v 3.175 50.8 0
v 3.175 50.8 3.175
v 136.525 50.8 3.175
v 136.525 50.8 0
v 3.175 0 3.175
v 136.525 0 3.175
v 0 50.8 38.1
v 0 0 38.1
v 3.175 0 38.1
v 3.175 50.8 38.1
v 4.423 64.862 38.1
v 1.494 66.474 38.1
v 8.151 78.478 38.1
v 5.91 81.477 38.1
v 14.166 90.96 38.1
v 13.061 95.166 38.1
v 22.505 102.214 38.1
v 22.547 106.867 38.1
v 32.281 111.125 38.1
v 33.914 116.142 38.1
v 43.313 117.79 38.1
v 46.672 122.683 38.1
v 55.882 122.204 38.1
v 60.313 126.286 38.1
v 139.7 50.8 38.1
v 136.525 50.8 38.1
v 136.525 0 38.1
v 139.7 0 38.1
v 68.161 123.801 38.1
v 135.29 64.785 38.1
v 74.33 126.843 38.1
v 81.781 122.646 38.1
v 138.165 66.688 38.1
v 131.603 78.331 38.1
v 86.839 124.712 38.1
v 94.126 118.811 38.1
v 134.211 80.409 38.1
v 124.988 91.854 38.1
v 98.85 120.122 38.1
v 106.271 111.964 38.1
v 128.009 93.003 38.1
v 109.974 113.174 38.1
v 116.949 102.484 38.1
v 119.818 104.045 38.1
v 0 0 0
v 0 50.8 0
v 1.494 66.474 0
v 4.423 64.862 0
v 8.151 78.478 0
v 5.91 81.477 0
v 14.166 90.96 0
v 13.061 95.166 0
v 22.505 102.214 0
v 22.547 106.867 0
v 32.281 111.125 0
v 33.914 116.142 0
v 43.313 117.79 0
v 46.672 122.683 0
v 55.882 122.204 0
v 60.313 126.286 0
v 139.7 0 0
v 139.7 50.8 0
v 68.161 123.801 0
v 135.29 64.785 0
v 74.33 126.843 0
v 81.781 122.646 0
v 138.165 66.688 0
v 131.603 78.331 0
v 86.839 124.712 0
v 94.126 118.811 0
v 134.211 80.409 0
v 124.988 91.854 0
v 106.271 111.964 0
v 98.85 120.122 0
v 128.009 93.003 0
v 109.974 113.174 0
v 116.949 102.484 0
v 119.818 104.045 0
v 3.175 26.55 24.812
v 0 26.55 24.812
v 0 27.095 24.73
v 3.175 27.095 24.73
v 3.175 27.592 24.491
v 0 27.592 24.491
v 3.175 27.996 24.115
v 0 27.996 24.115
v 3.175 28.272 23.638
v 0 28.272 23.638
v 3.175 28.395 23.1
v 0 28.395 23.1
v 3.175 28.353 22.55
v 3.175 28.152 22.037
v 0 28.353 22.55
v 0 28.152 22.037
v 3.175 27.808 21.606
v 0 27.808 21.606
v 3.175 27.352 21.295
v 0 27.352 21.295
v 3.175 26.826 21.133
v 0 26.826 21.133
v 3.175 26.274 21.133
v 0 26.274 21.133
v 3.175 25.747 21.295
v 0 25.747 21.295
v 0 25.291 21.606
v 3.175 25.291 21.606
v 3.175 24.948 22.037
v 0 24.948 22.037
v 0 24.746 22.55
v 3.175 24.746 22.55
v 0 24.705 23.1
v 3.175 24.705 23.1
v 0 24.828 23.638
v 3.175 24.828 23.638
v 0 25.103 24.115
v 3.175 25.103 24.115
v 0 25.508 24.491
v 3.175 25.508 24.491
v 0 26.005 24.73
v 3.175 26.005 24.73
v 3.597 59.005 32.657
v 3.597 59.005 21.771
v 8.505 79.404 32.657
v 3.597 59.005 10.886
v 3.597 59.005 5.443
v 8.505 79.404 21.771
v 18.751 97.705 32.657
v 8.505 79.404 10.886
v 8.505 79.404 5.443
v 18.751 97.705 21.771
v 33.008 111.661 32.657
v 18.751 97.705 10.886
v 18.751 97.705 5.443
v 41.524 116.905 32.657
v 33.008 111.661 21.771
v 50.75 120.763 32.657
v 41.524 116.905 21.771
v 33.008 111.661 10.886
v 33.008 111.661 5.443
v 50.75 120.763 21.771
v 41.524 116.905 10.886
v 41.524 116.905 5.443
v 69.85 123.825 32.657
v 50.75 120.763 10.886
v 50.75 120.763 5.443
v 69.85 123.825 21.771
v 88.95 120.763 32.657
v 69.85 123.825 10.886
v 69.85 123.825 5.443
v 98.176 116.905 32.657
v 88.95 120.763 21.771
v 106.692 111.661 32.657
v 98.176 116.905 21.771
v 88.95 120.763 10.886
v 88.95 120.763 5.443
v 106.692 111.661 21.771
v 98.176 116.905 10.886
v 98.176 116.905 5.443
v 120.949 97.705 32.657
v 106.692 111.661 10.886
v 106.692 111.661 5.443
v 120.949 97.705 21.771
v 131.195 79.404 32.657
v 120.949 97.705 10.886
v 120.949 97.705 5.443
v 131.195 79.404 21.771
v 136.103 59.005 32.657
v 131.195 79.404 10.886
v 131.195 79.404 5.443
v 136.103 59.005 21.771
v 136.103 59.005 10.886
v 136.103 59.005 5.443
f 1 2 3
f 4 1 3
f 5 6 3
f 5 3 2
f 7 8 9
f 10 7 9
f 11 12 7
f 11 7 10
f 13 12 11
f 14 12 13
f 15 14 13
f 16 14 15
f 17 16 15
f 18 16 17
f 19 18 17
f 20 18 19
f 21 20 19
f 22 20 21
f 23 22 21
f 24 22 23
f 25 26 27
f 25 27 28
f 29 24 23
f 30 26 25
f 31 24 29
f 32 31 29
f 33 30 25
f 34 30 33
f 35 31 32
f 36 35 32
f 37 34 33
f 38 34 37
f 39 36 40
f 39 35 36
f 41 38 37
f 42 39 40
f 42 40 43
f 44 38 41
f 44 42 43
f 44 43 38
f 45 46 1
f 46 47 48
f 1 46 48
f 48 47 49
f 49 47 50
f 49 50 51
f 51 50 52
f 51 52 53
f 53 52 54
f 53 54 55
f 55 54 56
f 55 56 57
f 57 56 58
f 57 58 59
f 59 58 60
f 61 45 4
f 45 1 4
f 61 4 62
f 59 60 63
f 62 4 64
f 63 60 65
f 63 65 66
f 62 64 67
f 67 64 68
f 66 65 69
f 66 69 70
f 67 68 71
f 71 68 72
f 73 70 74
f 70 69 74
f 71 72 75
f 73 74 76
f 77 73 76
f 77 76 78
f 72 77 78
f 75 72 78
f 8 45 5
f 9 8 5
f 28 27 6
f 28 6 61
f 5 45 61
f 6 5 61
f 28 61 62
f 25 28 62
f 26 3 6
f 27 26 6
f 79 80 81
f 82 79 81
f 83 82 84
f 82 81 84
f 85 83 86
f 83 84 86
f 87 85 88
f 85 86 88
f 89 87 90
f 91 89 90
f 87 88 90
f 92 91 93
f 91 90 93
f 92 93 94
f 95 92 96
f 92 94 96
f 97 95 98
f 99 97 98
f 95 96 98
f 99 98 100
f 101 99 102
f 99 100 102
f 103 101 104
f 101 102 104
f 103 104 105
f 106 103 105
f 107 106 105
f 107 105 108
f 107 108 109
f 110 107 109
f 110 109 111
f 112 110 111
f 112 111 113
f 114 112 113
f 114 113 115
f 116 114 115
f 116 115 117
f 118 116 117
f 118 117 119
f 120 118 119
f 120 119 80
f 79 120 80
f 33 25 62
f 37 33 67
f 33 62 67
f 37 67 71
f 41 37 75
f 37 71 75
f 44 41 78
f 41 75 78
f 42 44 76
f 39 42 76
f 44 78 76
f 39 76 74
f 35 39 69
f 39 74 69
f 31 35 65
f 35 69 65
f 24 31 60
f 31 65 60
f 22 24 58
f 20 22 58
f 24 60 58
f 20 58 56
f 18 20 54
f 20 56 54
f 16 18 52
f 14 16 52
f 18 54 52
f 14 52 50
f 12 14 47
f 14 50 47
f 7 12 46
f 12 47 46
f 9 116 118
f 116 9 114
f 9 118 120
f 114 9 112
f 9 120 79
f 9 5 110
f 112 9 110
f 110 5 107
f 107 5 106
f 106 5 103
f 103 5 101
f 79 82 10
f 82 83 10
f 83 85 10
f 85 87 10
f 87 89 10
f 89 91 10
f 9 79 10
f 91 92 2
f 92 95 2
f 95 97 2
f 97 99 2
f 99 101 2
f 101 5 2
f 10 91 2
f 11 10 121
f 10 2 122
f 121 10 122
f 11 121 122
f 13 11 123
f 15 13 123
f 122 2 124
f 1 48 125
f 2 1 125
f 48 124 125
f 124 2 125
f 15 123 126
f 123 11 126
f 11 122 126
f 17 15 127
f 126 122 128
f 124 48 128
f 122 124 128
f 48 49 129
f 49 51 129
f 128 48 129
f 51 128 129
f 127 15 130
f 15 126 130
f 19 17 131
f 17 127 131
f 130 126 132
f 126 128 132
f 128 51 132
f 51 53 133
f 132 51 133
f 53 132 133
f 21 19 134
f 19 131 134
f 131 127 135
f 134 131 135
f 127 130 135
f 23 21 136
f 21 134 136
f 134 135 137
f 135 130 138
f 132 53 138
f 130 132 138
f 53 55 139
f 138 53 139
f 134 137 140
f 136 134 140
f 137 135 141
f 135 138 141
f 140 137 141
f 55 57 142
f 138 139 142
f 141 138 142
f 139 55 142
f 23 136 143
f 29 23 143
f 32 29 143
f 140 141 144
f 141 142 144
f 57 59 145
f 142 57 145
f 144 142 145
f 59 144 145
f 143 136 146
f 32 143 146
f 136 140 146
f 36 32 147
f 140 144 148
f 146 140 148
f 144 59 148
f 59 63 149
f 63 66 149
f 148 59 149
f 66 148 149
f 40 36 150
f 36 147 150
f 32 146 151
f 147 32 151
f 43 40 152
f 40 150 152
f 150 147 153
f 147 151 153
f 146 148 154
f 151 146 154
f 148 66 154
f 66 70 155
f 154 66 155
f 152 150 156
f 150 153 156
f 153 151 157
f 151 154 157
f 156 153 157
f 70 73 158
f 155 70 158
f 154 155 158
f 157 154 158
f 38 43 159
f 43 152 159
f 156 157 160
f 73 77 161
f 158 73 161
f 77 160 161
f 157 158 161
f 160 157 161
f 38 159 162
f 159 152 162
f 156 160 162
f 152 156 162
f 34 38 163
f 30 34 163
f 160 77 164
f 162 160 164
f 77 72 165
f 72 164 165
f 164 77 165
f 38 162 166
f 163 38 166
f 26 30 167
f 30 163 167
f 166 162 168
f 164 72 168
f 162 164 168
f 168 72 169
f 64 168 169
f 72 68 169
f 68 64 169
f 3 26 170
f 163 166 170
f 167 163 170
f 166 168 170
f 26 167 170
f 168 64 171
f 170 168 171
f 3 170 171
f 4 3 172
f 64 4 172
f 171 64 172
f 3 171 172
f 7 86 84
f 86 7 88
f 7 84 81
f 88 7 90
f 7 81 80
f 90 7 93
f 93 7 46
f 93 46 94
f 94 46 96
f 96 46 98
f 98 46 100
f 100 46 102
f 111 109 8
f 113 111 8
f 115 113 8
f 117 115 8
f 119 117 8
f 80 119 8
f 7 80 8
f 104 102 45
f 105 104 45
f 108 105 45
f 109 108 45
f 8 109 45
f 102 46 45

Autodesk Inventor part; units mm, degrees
ref_plane "YZ Plane" through (0, 0, 0) normal (1, 0, 0) x (0, 1, 0)
ref_plane "XZ Plane" through (0, 0, 0) normal (0, 1, 0) x (-1, 0, 0)
sketch "Sketch1" plane through (0, 0, 0) normal (0, 0, 1) x (1, 0, 0)
  line L0 (139.7, 0) -> (139.7, 50.8)
  line L1 (0, 50.8) -> (0, 0)
  ellipse E0 centre (69.85, 50.8) end of major axis (139.7, 50.8) minor radius 76.2 (139.7, 50.8) -> (0, 50.8) ccw
  line L2 (136.525, 50.8) -> (136.525, 3.175)
  line L3 (3.175, 3.175) -> (3.175, 50.8)
  line L4 (3.175, 3.175) -> (3.175, 0)
  line L5 (136.525, 3.175) -> (136.525, 0)
  line L6 (0, 0) -> (3.175, 0)
  line L7 (136.525, 0) -> (139.7, 0)
  spline S0 degree 5 poles (3.175, 50.8) (3.175, 52.444) (3.2172, 54.088) (3.3017, 55.7305) (4.0773, 65.7654) (6.4328, 75.6371) (9.4981, 83.5865) (17.5722, 98.0931) (29.3701, 109.7459) (35.928, 114.5559) (50.1357, 121.8737) (65.8938, 124.4523) (73.8062, 124.4523) (89.5643, 121.8737) (103.772, 114.5559) (110.3299, 109.7459) (122.1278, 98.0931) (130.2019, 83.5865) (133.2672, 75.6371) (135.6227, 65.7654) (136.3983, 55.7305) (136.4828, 54.088) (136.525, 52.444) (136.525, 50.8) knots 0 0 0 0 0 0 0.03744 0.03744 0.03744 0.22914 0.22914 0.22914 0.411521 0.411521 0.411521 0.588479 0.588479 0.588479 0.77086 0.77086 0.77086 0.96256 0.96256 0.96256 1 1 1 1 1 1
  dimension "d0" = 139.7
  dimension "d1" = 50.8
extrude "Extrusion1" add sketch "Sketch1" along normal blind 38.1
ref_plane "Work Plane1" through (136.525, 0, 0) normal (0, -1, 0) x (1, 0, 0)
sketch "Sketch2" plane through (136.525, 0, 0) normal (0, -1, 0) x (1, 0, 0)
  line L0 (-136.525, 0) -> (3.175, 0)
  line L1 (3.175, 0) -> (3.175, 3.175)
  line L2 (3.175, 3.175) -> (-136.525, 3.175)
  line L3 (-136.525, 3.175) -> (-136.525, 0)
  dimension "d7" = 139.7
  dimension "d8" = 3.175
extrude "Extrusion2" add sketch "Sketch2" against normal blind 50.8
sketch "Sketch3" plane through (0, 0, 38.1) normal (-1, 0, 0) x (0, 0, 1)
  circle A0 centre (-15.138, 26.5498) radius 1.85
  point P0 (-38.1, 0)
  dimension "d11" = 3.7
extrude "Extrusion3" cut sketch "Sketch3" against normal blind 50.8
properties part number "Bucket Flap" material "Polycarbonate, Clear"
